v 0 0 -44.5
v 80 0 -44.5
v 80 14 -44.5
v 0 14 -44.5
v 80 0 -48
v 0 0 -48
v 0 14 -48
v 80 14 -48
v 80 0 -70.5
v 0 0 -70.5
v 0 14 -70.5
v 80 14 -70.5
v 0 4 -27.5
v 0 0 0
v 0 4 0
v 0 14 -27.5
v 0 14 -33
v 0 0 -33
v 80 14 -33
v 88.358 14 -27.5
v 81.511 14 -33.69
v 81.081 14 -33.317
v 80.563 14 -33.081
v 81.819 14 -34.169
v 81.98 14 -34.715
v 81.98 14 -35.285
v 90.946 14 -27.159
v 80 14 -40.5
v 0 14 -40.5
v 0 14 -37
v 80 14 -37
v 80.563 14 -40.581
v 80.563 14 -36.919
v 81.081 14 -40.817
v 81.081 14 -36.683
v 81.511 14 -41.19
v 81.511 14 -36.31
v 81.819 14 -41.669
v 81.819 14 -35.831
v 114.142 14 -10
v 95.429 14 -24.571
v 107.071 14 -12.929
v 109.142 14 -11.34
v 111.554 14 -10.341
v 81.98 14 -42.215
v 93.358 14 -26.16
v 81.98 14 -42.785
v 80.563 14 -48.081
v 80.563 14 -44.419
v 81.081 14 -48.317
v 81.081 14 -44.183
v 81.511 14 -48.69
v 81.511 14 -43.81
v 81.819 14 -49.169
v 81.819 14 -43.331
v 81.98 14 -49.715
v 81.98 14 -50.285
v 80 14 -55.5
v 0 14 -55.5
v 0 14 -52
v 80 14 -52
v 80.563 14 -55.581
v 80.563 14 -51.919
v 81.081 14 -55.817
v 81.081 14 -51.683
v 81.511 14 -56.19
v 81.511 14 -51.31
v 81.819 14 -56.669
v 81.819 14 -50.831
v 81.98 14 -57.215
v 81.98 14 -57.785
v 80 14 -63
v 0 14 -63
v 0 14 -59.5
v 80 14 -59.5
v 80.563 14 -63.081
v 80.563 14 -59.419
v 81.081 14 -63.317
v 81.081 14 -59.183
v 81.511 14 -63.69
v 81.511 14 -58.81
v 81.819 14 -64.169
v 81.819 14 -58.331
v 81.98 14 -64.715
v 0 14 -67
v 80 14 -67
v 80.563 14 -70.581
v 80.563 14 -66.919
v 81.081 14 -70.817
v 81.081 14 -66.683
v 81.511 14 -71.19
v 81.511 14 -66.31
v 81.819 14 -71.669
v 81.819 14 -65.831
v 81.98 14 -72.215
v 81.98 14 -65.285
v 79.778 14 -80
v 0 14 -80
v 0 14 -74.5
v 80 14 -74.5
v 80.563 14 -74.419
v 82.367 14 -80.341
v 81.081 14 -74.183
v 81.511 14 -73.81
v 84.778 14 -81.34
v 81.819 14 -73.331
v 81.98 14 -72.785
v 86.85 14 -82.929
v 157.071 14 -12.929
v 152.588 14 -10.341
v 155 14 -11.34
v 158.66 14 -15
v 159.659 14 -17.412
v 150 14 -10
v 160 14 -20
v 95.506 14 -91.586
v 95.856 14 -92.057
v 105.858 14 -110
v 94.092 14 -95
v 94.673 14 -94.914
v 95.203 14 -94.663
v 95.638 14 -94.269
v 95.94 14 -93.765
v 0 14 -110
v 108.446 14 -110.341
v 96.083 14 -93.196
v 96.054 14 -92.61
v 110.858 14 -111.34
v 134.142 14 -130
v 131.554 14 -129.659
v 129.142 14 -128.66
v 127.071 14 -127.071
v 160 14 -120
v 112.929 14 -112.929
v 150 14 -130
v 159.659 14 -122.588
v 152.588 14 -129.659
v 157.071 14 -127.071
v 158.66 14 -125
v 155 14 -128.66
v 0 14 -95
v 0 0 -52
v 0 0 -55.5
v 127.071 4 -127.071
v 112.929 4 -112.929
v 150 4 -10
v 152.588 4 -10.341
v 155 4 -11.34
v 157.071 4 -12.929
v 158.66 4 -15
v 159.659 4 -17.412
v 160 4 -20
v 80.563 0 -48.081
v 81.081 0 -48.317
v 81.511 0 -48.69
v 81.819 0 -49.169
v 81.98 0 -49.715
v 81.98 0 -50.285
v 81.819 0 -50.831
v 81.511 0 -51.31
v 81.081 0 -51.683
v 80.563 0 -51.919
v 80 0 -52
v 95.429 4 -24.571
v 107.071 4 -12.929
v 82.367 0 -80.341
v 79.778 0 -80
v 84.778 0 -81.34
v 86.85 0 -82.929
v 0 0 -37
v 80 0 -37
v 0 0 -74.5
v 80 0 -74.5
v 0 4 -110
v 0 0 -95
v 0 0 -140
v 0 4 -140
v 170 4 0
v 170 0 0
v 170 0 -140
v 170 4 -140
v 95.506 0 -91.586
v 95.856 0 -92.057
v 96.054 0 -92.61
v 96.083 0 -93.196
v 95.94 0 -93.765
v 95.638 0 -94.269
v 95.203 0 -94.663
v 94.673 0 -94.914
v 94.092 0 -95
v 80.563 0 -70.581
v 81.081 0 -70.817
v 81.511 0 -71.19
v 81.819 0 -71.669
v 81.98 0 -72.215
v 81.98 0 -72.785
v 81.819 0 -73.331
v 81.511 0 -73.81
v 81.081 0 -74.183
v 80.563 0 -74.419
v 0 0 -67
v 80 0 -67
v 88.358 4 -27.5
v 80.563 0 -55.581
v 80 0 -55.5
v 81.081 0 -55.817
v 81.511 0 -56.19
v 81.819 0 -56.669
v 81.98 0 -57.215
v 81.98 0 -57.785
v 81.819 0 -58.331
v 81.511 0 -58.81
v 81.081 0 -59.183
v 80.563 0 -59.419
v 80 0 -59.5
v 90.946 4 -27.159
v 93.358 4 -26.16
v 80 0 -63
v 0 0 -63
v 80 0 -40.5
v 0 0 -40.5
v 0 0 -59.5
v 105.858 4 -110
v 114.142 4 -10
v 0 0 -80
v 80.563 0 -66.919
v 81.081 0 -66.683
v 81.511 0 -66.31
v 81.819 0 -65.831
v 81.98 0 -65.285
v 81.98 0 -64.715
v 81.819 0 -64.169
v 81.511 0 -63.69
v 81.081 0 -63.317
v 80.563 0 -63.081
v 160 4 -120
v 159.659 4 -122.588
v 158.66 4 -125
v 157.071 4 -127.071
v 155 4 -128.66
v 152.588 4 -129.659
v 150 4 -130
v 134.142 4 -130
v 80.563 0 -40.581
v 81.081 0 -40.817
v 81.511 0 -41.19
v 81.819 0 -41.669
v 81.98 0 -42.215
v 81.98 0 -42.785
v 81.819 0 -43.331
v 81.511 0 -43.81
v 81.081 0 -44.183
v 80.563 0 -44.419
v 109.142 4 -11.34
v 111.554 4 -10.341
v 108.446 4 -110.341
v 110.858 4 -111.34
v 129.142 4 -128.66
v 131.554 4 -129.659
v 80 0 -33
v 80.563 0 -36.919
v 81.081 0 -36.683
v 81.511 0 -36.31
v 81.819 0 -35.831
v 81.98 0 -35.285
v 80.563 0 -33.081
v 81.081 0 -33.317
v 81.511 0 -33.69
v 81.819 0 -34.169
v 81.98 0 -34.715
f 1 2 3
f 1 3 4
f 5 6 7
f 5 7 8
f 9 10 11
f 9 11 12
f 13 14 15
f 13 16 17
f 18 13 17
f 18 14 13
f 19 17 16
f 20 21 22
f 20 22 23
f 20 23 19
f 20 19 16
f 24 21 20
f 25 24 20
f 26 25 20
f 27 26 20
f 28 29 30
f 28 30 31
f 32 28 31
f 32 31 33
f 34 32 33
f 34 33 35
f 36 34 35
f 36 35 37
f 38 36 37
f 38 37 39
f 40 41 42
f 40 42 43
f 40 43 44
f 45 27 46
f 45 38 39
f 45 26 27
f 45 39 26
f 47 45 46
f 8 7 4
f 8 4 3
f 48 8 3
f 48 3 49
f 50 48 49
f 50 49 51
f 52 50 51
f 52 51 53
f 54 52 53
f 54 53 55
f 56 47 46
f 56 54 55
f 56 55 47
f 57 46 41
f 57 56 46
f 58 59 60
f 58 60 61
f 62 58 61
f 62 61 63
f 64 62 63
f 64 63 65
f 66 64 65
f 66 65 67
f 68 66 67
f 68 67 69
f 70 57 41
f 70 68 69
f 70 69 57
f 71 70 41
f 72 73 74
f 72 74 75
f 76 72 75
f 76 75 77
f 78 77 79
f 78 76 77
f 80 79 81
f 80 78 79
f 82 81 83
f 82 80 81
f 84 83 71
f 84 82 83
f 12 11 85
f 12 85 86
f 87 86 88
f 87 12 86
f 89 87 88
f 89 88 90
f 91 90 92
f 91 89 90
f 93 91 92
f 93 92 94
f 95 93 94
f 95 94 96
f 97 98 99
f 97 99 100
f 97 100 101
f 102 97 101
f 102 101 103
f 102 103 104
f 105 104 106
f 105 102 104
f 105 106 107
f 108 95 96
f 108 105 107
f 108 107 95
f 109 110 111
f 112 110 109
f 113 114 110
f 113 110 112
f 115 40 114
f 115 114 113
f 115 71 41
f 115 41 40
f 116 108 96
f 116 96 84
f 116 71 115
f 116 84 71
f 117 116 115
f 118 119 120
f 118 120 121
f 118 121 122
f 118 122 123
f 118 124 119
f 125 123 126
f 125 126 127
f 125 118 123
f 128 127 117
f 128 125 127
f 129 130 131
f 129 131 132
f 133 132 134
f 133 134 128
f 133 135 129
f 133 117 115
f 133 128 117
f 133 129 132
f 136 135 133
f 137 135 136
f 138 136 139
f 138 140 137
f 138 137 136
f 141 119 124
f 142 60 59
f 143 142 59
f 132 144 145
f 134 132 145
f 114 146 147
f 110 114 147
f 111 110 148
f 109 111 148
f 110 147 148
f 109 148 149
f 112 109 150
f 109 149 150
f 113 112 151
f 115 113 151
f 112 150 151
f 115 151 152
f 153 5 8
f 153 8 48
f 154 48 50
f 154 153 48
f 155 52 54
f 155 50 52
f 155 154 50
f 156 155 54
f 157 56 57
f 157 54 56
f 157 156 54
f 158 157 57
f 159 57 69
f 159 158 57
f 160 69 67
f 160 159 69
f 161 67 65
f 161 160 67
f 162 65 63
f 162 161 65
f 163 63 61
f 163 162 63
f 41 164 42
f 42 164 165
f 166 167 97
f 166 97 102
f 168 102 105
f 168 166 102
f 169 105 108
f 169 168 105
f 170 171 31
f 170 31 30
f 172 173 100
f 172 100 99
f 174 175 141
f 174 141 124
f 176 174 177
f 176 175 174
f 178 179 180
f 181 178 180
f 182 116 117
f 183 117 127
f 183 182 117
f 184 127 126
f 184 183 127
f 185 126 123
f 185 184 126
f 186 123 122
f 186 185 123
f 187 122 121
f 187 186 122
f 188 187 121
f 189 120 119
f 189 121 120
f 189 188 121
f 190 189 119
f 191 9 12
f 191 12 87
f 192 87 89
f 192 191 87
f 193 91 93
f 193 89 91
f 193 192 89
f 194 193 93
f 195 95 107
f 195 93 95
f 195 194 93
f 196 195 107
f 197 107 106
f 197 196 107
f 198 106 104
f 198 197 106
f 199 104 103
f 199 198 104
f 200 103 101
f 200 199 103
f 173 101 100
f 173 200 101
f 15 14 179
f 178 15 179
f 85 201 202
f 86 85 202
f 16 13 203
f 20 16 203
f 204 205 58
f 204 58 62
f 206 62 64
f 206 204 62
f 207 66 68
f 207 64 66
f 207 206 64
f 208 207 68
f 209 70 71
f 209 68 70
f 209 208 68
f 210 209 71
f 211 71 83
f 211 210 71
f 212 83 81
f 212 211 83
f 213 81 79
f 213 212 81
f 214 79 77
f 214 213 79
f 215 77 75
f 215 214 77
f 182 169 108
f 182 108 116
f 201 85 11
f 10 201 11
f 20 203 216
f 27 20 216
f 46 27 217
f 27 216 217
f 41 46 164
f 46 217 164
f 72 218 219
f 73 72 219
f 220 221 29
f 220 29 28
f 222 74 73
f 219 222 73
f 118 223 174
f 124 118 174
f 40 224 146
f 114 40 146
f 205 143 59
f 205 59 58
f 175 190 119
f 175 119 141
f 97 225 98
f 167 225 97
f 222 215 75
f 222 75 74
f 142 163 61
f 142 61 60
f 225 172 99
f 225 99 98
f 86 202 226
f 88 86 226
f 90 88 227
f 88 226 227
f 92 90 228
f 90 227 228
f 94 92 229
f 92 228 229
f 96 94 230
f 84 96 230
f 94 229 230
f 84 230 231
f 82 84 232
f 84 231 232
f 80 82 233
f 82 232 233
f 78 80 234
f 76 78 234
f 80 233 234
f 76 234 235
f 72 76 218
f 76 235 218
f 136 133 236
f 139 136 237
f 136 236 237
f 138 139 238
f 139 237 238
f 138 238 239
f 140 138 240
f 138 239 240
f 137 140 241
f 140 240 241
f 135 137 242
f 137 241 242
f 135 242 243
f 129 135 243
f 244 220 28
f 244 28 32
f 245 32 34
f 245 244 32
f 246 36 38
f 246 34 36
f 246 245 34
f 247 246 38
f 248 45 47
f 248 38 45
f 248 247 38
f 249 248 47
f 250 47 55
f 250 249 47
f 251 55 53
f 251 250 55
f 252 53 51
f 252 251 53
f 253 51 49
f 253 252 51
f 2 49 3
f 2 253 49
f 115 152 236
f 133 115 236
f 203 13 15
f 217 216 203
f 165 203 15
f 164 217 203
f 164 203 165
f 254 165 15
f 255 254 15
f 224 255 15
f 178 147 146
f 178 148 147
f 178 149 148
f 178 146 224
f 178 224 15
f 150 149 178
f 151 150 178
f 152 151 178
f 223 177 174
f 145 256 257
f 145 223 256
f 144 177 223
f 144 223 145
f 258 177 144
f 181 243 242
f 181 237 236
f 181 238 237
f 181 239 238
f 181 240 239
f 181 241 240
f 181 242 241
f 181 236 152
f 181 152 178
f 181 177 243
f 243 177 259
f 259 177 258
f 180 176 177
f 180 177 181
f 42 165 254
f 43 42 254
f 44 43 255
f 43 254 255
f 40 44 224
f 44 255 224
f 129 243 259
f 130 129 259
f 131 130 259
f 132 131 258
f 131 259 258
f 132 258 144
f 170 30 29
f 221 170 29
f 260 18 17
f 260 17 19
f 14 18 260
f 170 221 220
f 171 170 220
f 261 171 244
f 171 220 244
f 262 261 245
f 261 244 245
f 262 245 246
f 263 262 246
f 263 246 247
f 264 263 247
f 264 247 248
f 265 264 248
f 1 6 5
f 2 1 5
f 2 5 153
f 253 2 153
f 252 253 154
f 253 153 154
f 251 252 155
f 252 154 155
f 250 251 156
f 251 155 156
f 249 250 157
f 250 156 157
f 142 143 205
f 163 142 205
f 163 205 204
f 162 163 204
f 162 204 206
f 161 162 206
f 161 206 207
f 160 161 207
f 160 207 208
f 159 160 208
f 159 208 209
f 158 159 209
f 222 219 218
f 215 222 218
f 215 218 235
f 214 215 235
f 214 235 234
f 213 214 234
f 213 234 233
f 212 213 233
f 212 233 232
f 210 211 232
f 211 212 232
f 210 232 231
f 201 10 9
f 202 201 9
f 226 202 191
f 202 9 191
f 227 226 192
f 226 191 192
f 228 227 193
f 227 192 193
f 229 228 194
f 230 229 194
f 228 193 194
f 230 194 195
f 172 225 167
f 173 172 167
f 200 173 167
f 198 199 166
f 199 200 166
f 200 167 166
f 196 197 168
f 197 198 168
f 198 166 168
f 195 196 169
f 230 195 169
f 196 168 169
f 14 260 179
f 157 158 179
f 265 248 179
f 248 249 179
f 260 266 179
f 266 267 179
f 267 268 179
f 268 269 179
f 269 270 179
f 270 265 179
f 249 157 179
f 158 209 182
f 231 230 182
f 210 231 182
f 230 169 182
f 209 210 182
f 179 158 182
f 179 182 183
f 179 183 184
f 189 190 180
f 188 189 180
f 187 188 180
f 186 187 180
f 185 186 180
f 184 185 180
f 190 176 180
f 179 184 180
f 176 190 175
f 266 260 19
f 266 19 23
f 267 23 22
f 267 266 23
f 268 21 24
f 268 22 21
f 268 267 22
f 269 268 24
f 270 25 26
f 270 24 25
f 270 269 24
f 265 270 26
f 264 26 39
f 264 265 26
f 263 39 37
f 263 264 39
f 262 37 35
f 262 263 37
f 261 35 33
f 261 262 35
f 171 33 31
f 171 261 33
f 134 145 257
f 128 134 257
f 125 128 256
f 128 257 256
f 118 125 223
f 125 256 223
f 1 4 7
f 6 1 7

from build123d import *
from build123d.topology import SkipClean

# Parameters (mm, degrees)
SKETCH1_W               = 170
SKETCH1_H               = 140
BOSS_EXTRUDE1_DEPTH     = 4
BOSS_EXTRUDE2_DEPTH     = 10
CUT_EXTRUDE3_DEPTH      = 221.671701856
CUT_EXTRUDE3_DEPTH_BACK = 221.671701856
CUT_EXTRUDE6_DEPTH      = 10


with BuildPart() as part:
    # Sketch1 → Boss-Extrude1 (new body)
    with BuildSketch(Plane(origin=(0, 0, 0), x_dir=(1, 0, 0), z_dir=(0, 1, 0))):
        with Locations((85, 70)):
            Rectangle(SKETCH1_W, SKETCH1_H)
    extrude(amount=BOSS_EXTRUDE1_DEPTH)

    # Sketch2 → Boss-Extrude2 (add)
    with BuildSketch(Plane(origin=(0, 4, 0), x_dir=(1, 0, 0), z_dir=(0, 1, 0))):
        with BuildLine():
            Line((127.071067812, 127.071067812), (112.928932188, 112.928932188))
            ThreePointArc((112.928932188, 112.928932188), (109.6846987, 110.761204675), (105.857864376, 110))
            Line((105.857864376, 110), (0, 110))
            Line((0, 110), (0, 95))
            Line((0, 95), (94.092172608, 95))
            ThreePointArc((94.092172608, 95), (95.939931673, 93.765366865), (95.50638617, 91.585786438))
            Line((95.50638617, 91.585786438), (86.849531921, 82.928932188))
            ThreePointArc((86.849531921, 82.928932188), (83.605298432, 80.761204675), (79.778464109, 80))
            Line((79.778464109, 80), (30.446951372, 80))
            Line((30.446951372, 80), (0, 80))
            Line((0, 80), (0, 74.5))
            Line((0, 74.5), (80, 74.5))
            ThreePointArc((80, 74.5), (82, 72.5), (80, 70.5))
            Line((80, 70.5), (0, 70.5))
            Line((0, 70.5), (0, 67))
            Line((0, 67), (80, 67))
            ThreePointArc((80, 67), (82, 65), (80, 63))
            Line((80, 63), (0, 63))
            Line((0, 63), (0, 59.5))
            Line((0, 59.5), (80, 59.5))
            ThreePointArc((80, 59.5), (82, 57.5), (80, 55.5))
            Line((80, 55.5), (0, 55.5))
            Line((0, 55.5), (0, 52))
            Line((0, 52), (80, 52))
            ThreePointArc((80, 52), (82, 50), (80, 48))
            Line((80, 48), (0, 48))
            Line((0, 48), (0, 44.5))
            Line((0, 44.5), (80, 44.5))
            ThreePointArc((80, 44.5), (82, 42.5), (80, 40.5))
            Line((80, 40.5), (0, 40.5))
            Line((0, 40.5), (0, 37))
            Line((0, 37), (80, 37))
            ThreePointArc((80, 37), (82, 35), (80, 33))
            Line((80, 33), (0, 33))
            Line((0, 33), (0, 27.5))
            Line((0, 27.5), (88.357864376, 27.5))
            ThreePointArc((88.357864376, 27.5), (92.1846987, 26.738795325), (95.428932188, 24.571067812))
            Line((95.428932188, 24.571067812), (107.071067812, 12.928932188))
            ThreePointArc((107.071067812, 12.928932188), (110.3153013, 10.761204675), (114.142135624, 10))
            Line((114.142135624, 10), (150, 10))
            ThreePointArc((150, 10), (157.071067812, 12.928932188), (160, 20))
            Line((160, 20), (160, 120))
            ThreePointArc((160, 120), (157.071067812, 127.071067812), (150, 130))
            Line((150, 130), (134.142135624, 130))
            ThreePointArc((134.142135624, 130), (130.3153013, 129.238795325), (127.071067812, 127.071067812))
        make_face()
    extrude(amount=BOSS_EXTRUDE2_DEPTH)

    # Sketch4 → Cut-Extrude3 (cut, two sides: drawn at the far end of the back side and taken through both)
    with SkipClean():  # the faces are left unmerged after this step: merging them gives an invalid solid
        with BuildSketch(Plane(origin=(0, 0, 0), x_dir=(1, 0, 0), z_dir=(0, 1, 0)).offset(-CUT_EXTRUDE3_DEPTH_BACK)):
            with BuildLine():
                Line((94.092172608, 95), (0, 95))
                Line((0, 95), (0, 80))
                Line((0, 80), (30.446951372, 80))
                Line((30.446951372, 80), (79.778464109, 80))
                ThreePointArc((79.778464109, 80), (83.605298432, 80.761204675), (86.849531921, 82.928932188))
                Line((86.849531921, 82.928932188), (95.50638617, 91.585786438))
                ThreePointArc((95.50638617, 91.585786438), (95.939931673, 93.765366865), (94.092172608, 95))
            make_face()
        extrude(amount=CUT_EXTRUDE3_DEPTH + CUT_EXTRUDE3_DEPTH_BACK, mode=Mode.SUBTRACT)
    add(part.part.scale(1), mode=Mode.REPLACE)  # the faces are merged on a copy

    # Sketch5 → Cut-Extrude6 (cut)
    with BuildSketch(Plane(origin=(0, 0, 0), x_dir=(1, 0, 0), z_dir=(0, 1, 0))):
        with BuildLine():
            Line((-80, 70.5), (80, 70.5))
            ThreePointArc((80, 70.5), (82, 72.5), (80, 74.5))
            Line((80, 74.5), (-80, 74.5))
            ThreePointArc((-80, 74.5), (-82, 72.5), (-80, 70.5))
        make_face()
        with BuildLine():
            Line((80, 63), (-80, 63))
            ThreePointArc((-80, 63), (-82, 65), (-80, 67))
            Line((-80, 67), (80, 67))
            ThreePointArc((80, 67), (82, 65), (80, 63))
        make_face()
        with BuildLine():
            Line((-80, 55.5), (80, 55.5))
            ThreePointArc((80, 55.5), (82, 57.5), (80, 59.5))
            Line((80, 59.5), (-80, 59.5))
            ThreePointArc((-80, 59.5), (-82, 57.5), (-80, 55.5))
        make_face()
        with BuildLine():
            Line((-80, 48), (80, 48))
            ThreePointArc((80, 48), (82, 50), (80, 52))
            Line((80, 52), (-80, 52))
            ThreePointArc((-80, 52), (-82, 50), (-80, 48))
        make_face()
        with BuildLine():
            Line((-80, 40.5), (80, 40.5))
            ThreePointArc((80, 40.5), (82, 42.5), (80, 44.5))
            Line((80, 44.5), (-80, 44.5))
            ThreePointArc((-80, 44.5), (-82, 42.5), (-80, 40.5))
        make_face()
        with BuildLine():
            Line((-80, 33), (80, 33))
            ThreePointArc((80, 33), (82, 35), (80, 37))
            Line((80, 37), (-80, 37))
            ThreePointArc((-80, 37), (-82, 35), (-80, 33))
        make_face()
    extrude(amount=CUT_EXTRUDE6_DEPTH, mode=Mode.SUBTRACT)


solid = part.part
